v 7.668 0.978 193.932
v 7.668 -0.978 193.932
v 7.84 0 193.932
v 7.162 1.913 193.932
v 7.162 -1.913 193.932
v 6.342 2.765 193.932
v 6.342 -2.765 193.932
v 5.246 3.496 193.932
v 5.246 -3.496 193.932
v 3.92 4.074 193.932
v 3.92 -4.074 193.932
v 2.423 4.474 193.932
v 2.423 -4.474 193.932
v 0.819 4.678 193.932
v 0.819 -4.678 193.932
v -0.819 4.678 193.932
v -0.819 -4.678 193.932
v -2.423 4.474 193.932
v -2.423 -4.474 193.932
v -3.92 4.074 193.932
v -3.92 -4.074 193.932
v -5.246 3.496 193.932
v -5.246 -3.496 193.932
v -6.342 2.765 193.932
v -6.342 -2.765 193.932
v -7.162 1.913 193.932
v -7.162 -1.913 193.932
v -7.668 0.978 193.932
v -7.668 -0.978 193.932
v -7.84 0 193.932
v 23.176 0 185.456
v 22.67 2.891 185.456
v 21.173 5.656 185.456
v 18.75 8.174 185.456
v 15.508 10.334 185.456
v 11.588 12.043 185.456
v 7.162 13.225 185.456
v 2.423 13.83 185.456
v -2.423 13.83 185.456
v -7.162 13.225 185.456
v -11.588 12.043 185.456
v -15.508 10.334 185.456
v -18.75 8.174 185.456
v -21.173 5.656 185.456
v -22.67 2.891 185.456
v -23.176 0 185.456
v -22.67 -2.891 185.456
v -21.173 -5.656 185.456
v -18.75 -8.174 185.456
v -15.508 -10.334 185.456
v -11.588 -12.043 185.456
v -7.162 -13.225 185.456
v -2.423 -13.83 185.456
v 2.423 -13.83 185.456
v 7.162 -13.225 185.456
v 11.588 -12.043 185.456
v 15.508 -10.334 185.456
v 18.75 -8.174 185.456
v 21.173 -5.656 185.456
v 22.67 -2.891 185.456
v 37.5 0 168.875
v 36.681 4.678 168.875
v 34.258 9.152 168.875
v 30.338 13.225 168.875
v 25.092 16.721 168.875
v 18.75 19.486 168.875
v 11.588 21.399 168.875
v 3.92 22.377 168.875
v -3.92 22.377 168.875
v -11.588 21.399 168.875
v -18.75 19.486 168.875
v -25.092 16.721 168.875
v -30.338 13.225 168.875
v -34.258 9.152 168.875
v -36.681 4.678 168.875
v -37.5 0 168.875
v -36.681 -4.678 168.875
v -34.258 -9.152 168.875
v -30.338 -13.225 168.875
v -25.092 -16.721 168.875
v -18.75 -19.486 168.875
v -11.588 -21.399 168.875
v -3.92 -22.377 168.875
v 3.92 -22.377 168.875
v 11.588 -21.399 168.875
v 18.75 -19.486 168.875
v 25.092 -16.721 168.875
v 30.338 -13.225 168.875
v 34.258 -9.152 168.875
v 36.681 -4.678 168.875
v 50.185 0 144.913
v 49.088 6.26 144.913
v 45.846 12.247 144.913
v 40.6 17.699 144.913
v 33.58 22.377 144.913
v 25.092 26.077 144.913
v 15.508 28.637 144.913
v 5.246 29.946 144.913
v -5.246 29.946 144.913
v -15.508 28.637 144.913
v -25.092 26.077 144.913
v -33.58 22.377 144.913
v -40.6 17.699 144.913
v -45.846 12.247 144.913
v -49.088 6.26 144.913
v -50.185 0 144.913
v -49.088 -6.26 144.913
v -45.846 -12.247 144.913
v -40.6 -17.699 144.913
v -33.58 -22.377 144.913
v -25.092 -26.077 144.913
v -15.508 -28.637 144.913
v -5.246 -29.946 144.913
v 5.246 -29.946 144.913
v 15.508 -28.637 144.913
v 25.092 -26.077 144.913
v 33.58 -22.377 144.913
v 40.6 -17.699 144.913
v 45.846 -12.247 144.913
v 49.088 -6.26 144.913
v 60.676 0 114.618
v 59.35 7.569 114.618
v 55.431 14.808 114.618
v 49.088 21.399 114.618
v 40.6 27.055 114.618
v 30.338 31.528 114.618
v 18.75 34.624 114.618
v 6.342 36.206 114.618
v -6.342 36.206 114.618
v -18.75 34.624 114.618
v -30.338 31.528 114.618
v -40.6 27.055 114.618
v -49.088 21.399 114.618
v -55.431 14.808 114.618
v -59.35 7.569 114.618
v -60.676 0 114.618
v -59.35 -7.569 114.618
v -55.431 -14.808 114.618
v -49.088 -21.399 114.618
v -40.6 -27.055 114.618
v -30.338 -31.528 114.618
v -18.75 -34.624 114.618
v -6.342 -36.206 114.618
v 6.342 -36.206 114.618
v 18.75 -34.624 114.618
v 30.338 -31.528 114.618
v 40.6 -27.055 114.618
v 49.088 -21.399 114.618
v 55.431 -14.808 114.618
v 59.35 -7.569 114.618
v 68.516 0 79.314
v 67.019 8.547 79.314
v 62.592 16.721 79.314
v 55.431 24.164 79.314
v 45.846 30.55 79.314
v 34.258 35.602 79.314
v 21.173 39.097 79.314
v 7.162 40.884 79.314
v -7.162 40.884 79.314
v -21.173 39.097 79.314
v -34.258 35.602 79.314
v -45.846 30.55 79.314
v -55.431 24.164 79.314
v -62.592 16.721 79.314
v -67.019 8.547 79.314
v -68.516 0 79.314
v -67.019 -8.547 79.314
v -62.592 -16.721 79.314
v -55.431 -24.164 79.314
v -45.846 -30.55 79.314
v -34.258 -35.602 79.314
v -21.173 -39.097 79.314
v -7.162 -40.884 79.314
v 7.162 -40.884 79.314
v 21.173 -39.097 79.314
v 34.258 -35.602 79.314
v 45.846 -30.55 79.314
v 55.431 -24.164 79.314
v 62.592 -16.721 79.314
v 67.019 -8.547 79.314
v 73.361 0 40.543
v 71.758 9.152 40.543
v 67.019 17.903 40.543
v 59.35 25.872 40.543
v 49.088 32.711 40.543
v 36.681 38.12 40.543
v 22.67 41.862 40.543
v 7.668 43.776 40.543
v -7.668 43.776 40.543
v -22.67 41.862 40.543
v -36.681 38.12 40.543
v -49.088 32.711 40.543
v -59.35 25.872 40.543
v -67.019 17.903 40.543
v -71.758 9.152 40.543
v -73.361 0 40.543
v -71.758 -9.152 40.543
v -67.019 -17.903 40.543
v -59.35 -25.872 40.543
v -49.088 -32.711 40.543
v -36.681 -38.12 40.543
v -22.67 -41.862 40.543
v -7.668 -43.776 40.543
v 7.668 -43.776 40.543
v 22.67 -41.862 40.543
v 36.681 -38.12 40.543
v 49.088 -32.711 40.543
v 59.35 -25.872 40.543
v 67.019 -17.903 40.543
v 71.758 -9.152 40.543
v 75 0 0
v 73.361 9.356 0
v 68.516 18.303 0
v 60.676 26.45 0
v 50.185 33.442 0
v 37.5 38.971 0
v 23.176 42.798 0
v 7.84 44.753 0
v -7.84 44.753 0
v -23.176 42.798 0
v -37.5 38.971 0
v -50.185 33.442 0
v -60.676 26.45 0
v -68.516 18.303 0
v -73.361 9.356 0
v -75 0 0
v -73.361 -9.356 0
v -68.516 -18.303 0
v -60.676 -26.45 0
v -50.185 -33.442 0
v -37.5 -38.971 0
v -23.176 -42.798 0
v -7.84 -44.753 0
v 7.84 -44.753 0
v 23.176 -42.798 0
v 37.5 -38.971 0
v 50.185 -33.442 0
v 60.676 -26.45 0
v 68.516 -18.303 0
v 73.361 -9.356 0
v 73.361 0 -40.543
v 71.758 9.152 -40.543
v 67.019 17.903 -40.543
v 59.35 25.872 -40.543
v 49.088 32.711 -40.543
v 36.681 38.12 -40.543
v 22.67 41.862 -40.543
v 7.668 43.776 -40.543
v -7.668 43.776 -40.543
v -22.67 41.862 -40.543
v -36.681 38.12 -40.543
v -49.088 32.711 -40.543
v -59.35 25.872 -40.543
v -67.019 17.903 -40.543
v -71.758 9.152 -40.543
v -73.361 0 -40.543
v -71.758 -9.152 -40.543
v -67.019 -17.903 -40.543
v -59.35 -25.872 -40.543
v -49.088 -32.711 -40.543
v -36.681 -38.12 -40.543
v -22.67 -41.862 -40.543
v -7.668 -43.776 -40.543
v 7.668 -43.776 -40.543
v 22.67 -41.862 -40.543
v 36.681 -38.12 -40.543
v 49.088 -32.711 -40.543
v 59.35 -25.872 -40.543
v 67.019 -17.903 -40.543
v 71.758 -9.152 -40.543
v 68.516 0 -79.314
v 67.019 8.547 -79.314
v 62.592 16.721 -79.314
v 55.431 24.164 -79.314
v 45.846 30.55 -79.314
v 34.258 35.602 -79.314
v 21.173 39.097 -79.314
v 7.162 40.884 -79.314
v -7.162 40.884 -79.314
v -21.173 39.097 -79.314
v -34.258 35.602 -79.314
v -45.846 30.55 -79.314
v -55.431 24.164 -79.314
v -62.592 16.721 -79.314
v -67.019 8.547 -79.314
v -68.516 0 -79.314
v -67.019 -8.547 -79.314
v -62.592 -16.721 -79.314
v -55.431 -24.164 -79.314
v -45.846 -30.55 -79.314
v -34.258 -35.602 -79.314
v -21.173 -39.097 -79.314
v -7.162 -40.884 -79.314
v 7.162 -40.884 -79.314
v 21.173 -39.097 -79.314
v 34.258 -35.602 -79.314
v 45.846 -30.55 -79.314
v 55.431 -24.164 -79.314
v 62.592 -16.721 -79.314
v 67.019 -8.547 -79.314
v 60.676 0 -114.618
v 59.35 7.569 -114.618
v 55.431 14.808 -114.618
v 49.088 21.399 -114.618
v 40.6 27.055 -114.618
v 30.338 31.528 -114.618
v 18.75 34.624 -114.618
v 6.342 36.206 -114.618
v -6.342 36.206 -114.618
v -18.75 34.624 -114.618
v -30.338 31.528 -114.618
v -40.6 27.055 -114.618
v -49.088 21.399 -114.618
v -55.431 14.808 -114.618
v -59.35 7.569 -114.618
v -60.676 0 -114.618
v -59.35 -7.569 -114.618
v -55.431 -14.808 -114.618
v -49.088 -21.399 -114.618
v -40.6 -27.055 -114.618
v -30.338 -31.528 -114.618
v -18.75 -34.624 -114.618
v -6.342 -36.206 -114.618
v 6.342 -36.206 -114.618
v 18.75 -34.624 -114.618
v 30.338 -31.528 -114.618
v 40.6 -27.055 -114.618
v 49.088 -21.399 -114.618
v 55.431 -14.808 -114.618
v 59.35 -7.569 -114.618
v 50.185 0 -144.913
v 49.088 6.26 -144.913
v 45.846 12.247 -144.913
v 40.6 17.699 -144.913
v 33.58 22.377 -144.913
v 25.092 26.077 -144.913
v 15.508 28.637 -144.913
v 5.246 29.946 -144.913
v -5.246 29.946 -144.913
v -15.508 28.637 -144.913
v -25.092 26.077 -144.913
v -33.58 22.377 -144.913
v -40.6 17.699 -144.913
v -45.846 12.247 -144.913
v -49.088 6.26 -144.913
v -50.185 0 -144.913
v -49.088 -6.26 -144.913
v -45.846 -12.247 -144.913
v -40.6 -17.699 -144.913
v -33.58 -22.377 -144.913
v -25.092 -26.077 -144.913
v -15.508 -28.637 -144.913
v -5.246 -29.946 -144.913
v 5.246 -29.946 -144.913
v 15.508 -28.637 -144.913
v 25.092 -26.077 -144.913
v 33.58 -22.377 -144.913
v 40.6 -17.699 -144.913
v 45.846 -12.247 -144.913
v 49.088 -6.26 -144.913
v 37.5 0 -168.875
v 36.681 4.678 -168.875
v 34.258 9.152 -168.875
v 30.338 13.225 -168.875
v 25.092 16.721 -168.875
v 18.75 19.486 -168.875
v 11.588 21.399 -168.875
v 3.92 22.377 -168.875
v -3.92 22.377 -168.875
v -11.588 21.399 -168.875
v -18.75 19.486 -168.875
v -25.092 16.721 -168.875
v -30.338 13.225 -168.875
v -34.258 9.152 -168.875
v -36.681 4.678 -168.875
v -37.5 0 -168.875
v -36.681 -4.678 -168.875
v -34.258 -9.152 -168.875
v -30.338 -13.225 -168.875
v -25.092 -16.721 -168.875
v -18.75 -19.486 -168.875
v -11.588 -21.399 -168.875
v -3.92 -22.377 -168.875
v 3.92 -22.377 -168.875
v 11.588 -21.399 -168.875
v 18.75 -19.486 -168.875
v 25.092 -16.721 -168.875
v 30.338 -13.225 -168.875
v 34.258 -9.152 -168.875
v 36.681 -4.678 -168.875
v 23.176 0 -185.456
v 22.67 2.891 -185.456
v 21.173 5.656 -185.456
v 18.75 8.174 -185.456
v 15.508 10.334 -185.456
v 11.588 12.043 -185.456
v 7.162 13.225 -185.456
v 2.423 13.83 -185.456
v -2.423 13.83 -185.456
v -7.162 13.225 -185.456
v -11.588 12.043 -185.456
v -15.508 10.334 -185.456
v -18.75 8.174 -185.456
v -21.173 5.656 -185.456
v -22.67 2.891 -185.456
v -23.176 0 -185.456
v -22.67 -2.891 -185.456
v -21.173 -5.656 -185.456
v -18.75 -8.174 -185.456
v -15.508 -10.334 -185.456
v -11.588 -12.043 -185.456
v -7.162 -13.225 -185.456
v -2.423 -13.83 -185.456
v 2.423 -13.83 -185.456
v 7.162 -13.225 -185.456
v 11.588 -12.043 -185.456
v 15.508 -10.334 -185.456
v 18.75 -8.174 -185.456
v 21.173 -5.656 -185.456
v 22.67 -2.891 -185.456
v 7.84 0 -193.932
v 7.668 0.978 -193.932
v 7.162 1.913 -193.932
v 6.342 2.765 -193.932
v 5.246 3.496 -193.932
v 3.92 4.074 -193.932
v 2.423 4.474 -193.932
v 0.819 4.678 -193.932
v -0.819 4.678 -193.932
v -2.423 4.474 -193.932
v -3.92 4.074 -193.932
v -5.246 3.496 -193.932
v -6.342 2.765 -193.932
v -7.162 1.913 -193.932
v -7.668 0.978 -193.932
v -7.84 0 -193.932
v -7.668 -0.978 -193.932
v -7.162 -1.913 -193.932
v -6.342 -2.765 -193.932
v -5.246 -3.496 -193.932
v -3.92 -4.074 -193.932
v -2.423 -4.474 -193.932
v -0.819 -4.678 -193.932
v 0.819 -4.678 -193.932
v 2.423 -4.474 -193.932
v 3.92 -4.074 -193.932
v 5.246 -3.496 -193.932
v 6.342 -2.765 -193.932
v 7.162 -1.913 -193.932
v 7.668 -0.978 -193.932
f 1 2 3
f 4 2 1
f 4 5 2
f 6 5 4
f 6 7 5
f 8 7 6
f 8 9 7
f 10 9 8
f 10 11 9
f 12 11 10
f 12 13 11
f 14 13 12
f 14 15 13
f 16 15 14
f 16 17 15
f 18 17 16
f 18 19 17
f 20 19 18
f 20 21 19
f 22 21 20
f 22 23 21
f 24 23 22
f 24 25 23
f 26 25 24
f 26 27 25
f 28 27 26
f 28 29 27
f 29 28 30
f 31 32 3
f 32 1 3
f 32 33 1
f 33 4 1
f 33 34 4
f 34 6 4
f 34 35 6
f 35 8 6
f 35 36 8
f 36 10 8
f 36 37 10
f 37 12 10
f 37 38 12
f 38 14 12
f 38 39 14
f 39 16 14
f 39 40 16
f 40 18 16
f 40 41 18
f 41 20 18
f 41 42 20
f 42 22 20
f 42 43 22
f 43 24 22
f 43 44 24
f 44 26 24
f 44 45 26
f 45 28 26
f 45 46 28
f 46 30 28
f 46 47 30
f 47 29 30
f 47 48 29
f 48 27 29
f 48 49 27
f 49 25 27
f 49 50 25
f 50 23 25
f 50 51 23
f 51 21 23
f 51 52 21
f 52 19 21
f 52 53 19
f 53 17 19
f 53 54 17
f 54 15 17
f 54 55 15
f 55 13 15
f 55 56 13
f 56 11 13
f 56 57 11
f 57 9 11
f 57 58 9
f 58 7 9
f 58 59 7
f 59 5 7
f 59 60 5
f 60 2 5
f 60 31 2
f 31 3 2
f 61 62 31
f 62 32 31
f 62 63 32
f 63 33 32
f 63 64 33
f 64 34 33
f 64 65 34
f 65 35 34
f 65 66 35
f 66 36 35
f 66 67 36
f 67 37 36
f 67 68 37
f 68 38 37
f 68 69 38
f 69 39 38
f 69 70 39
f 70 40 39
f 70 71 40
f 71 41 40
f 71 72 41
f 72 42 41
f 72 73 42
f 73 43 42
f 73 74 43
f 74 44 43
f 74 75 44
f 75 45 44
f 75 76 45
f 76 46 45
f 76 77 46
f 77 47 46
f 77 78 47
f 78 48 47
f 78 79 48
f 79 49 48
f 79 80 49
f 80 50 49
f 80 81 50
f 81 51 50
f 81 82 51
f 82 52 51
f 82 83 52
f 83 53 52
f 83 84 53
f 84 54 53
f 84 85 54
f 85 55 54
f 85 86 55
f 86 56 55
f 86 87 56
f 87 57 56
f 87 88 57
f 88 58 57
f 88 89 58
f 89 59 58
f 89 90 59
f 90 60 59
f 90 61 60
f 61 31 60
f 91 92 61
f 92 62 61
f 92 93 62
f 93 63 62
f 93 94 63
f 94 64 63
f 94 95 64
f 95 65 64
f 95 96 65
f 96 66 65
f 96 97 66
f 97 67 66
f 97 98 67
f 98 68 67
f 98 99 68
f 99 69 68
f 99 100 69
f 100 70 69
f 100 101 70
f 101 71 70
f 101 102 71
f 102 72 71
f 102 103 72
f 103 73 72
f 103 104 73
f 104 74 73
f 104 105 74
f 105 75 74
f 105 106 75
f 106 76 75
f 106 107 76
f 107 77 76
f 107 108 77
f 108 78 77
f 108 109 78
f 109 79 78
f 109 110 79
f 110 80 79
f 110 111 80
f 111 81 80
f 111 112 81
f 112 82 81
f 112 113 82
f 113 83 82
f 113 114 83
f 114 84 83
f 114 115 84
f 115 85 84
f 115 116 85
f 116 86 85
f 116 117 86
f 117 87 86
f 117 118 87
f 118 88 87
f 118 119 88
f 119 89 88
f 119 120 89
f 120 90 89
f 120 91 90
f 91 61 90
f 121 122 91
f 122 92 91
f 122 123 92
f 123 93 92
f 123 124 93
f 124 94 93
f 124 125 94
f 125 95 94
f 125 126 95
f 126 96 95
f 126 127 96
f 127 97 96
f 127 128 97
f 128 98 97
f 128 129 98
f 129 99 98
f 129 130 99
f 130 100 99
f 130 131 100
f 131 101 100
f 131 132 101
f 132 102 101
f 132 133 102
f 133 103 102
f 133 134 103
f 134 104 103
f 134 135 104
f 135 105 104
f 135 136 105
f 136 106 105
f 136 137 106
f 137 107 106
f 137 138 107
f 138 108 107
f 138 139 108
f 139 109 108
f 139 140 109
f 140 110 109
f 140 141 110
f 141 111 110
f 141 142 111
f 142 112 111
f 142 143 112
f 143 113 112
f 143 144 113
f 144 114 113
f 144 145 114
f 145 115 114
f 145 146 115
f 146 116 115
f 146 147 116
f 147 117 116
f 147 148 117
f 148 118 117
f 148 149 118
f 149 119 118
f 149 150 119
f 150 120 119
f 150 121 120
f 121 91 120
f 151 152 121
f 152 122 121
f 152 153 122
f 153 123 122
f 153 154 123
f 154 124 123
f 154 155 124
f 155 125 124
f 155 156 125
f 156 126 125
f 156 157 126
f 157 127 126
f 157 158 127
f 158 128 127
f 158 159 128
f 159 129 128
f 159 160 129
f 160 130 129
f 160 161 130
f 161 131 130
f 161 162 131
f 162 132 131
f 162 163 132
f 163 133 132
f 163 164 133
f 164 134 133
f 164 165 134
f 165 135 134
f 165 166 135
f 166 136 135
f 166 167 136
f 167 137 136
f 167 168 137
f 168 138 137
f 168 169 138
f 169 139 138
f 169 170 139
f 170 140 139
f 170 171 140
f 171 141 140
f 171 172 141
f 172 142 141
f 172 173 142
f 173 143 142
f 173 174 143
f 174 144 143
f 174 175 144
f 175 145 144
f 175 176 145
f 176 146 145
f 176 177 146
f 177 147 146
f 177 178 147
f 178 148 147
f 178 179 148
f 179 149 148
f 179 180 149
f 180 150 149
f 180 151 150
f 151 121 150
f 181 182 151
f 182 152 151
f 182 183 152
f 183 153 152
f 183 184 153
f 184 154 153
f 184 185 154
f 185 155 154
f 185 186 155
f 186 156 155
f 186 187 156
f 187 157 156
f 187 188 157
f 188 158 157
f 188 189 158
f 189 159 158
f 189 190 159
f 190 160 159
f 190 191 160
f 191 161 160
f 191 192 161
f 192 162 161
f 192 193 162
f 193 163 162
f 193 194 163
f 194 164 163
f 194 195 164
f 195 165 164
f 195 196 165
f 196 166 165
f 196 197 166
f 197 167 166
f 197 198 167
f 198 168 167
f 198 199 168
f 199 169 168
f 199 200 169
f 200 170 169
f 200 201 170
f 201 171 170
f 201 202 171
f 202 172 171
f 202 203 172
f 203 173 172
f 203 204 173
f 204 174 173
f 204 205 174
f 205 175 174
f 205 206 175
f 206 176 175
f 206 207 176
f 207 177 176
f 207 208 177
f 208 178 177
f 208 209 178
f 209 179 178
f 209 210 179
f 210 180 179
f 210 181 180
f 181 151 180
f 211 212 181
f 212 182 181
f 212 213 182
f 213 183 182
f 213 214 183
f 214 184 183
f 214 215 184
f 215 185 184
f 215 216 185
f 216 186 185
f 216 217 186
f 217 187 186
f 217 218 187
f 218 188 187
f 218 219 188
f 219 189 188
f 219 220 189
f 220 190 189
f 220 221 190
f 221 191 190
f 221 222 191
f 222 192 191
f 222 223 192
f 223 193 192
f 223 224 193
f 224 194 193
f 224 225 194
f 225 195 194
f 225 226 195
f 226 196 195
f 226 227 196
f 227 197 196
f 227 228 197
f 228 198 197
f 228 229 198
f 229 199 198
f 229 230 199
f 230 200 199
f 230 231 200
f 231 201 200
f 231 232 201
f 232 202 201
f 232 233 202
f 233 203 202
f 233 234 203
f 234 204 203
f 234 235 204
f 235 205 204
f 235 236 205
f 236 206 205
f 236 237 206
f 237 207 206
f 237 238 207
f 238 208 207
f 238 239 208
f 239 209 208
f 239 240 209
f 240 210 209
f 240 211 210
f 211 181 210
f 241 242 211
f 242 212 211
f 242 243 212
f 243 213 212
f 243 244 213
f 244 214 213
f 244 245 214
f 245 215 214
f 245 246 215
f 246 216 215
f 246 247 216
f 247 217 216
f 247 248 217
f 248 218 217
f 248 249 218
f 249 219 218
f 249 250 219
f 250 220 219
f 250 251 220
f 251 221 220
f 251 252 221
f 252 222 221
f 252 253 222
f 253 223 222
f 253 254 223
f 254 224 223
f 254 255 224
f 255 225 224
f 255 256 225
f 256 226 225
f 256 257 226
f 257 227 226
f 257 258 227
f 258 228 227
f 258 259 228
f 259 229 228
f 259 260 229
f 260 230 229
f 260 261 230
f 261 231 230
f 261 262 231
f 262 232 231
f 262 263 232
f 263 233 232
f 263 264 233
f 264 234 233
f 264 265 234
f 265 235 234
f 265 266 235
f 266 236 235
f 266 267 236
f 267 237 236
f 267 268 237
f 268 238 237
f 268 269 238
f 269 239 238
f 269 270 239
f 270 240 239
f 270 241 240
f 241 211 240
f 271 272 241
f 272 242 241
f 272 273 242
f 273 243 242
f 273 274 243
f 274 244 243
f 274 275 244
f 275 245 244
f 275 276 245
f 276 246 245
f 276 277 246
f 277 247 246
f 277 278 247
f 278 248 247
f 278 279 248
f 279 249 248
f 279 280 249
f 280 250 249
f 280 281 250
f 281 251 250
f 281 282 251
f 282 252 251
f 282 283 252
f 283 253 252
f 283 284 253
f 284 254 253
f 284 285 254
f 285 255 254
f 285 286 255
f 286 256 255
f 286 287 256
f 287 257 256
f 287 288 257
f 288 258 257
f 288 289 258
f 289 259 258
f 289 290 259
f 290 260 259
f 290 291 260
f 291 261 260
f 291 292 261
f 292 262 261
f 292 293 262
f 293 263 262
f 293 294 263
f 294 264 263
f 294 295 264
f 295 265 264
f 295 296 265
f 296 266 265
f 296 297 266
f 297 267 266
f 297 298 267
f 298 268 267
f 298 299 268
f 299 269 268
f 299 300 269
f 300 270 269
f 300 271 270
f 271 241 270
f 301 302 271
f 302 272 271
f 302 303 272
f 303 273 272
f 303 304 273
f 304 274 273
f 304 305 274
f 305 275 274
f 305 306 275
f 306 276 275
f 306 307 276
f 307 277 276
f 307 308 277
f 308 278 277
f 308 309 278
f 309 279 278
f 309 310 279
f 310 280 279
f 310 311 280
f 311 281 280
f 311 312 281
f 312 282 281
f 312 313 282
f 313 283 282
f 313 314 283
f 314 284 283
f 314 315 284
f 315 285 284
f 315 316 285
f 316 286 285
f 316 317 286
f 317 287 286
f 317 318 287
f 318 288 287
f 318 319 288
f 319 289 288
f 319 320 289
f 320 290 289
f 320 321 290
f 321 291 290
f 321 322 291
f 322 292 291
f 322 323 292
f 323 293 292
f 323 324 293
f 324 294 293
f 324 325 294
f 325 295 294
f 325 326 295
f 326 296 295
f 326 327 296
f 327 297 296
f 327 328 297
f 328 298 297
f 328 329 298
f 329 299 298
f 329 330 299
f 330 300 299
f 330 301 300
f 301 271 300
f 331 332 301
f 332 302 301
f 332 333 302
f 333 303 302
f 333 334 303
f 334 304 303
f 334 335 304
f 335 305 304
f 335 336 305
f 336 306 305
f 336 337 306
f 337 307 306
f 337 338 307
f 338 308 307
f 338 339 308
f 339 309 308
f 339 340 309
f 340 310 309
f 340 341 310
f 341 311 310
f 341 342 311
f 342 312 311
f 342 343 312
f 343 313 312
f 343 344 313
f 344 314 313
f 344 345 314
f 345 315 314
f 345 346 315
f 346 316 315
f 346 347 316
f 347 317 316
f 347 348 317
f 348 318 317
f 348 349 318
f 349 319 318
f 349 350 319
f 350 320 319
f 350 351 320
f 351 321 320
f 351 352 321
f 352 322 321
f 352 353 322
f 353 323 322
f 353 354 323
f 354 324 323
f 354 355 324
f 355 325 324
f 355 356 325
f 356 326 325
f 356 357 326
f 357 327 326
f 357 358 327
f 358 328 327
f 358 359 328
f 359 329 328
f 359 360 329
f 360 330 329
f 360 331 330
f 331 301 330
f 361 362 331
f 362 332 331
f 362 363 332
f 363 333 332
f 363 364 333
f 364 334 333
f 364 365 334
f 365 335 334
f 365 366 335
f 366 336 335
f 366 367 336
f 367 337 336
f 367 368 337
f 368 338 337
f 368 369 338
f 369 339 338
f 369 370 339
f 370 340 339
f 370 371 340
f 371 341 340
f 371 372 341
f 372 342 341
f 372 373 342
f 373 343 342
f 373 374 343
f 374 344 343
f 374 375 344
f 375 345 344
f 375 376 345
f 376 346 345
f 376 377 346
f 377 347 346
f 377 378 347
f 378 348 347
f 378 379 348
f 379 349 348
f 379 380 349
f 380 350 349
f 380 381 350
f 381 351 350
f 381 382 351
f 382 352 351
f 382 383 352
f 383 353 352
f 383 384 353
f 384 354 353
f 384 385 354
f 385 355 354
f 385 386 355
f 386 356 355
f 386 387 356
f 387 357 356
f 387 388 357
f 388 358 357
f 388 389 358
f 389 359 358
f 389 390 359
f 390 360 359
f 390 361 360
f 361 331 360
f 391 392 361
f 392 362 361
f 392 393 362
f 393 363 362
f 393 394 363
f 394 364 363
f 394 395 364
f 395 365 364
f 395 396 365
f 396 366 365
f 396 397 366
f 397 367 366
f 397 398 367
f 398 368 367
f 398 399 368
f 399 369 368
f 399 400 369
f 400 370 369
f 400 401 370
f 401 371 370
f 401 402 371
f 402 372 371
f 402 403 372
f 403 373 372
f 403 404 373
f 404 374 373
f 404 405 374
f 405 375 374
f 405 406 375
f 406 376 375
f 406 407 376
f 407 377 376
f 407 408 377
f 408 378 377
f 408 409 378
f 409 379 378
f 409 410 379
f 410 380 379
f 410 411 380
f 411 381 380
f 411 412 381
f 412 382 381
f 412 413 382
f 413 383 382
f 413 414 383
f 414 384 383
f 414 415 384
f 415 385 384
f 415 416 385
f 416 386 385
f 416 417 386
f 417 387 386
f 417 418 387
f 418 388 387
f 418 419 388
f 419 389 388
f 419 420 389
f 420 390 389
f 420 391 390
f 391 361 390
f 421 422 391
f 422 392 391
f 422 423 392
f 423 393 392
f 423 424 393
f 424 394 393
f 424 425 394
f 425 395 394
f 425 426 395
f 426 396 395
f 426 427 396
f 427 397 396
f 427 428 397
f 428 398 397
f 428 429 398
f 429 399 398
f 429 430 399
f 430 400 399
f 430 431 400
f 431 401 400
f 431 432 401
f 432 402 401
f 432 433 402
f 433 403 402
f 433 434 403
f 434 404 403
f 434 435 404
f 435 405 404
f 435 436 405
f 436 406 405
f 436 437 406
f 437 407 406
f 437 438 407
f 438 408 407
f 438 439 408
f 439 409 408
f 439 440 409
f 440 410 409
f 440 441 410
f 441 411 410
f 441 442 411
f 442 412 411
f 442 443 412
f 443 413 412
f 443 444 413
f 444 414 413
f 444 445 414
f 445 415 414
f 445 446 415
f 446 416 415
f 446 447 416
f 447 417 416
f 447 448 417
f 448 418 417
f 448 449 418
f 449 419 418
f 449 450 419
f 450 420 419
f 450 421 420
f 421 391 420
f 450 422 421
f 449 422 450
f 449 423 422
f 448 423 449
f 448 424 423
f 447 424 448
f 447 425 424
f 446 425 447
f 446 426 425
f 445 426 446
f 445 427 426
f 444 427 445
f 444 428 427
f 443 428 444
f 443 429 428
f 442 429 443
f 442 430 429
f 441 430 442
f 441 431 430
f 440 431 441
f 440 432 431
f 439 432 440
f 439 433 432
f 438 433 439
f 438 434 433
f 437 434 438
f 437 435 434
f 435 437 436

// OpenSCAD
// Generated by SolidPython 1.0.1 on 2020-07-29 00:46:46


scale(v = [5, 3, 13]) {
	sphere(r = 15);
}
/***********************************************
*********      SolidPython code:      **********
************************************************
 
# import packages: SolidPython
from solid import *
from solid.utils import *
from itertools import chain, combinations, permutations


class Resize:

    def __init__(self, scad_file):
        self.scad_file = scad_file
        #self.scad_file = import_scad(scad_file)
        # cone/cylinder param:
        self.r1 = 0
        self.r2 = 0
        self.h = 0
        # rectangular prism param:
        self.w = 0
        self.l = 0
        # ellipse param:
        self.r = 0

    # import OpenScad code (file name corresponds to shape)


    # classify shape + parameters
    def assign(self, param1, param2, param3):
        if self.scad_file == 'cone.scad':
            self.r1 = param1
            self.r2 = param2
            self.h = param3
        elif self.scad_file == 'cylinder.scad':
            self.r1 = param1
            self.r2 = param2
            self.h = param3
        elif self.scad_file == 'rectangularPrism.scad':
            self.h = param1
            self.l = param2
            self.w = param3
        else:
            self.r = param1
            self.h = param2

    # resize parameters
    def iterate(self):
        x = range(3, 20, 2)
        i = 1
        if self.scad_file == 'cone.scad':
            tempList = list(permutations(x, 2))
            for temp in tempList:
                param1 = temp[0]
                param2 = temp[1]
                filepath = 'produced_scad_files/' + 'cone' + str(param1) + '_' + str(param2) + '_' + '.scad'
                scad_render_to_file(cylinder(h=param1, r1=param2, r2=0), filepath)

        elif self.scad_file == 'cylinder.scad':
            tempList = list(permutations(x, 3))
            for temp in tempList:
                param1 = temp[0]
                param2 = temp[1]
                filepath = 'produced_scad_files/' + 'cylinder' + str(param1) + '_' + str(param2) + '_' + '.scad'
                scad_render_to_file(cylinder(h=param1, r1=param2, r2=param2), filepath)

        elif self.scad_file == 'rectangularPrism.scad':
            tempList = list(permutations(x, 3))
            for temp in tempList:
                param1 = temp[0]
                param2 = temp[1]
                param3 = temp[2]
                filepath = 'produced_scad_files/' + 'rectangularPrism' + str(param1) + '_' + str(param2) + '_' + str(
                    param3) + '.scad'
                scad_render_to_file(cube(size=(param1, param2, param3)), filepath)

        elif self.scad_file == 'ellipse.scad':
            tempList = list(permutations(x, 4))
            for temp in tempList:
                param1 = temp[0]
                param2 = temp[1]
                param3 = temp[2]
                param4 = temp[3]
                filepath = 'produced_scad_files/' + 'ellipse' + str(param1) + '_' + str(param2) + '_' + str(param3) + '_' + str(param4) + '.scad'
                scad_render_to_file(scale([param1, param2, param3])(sphere(r=param4)), filepath)

    def render_to_scadfile(self):
        scad_render_to_file(scad, 'example.scad') 
 
************************************************/
